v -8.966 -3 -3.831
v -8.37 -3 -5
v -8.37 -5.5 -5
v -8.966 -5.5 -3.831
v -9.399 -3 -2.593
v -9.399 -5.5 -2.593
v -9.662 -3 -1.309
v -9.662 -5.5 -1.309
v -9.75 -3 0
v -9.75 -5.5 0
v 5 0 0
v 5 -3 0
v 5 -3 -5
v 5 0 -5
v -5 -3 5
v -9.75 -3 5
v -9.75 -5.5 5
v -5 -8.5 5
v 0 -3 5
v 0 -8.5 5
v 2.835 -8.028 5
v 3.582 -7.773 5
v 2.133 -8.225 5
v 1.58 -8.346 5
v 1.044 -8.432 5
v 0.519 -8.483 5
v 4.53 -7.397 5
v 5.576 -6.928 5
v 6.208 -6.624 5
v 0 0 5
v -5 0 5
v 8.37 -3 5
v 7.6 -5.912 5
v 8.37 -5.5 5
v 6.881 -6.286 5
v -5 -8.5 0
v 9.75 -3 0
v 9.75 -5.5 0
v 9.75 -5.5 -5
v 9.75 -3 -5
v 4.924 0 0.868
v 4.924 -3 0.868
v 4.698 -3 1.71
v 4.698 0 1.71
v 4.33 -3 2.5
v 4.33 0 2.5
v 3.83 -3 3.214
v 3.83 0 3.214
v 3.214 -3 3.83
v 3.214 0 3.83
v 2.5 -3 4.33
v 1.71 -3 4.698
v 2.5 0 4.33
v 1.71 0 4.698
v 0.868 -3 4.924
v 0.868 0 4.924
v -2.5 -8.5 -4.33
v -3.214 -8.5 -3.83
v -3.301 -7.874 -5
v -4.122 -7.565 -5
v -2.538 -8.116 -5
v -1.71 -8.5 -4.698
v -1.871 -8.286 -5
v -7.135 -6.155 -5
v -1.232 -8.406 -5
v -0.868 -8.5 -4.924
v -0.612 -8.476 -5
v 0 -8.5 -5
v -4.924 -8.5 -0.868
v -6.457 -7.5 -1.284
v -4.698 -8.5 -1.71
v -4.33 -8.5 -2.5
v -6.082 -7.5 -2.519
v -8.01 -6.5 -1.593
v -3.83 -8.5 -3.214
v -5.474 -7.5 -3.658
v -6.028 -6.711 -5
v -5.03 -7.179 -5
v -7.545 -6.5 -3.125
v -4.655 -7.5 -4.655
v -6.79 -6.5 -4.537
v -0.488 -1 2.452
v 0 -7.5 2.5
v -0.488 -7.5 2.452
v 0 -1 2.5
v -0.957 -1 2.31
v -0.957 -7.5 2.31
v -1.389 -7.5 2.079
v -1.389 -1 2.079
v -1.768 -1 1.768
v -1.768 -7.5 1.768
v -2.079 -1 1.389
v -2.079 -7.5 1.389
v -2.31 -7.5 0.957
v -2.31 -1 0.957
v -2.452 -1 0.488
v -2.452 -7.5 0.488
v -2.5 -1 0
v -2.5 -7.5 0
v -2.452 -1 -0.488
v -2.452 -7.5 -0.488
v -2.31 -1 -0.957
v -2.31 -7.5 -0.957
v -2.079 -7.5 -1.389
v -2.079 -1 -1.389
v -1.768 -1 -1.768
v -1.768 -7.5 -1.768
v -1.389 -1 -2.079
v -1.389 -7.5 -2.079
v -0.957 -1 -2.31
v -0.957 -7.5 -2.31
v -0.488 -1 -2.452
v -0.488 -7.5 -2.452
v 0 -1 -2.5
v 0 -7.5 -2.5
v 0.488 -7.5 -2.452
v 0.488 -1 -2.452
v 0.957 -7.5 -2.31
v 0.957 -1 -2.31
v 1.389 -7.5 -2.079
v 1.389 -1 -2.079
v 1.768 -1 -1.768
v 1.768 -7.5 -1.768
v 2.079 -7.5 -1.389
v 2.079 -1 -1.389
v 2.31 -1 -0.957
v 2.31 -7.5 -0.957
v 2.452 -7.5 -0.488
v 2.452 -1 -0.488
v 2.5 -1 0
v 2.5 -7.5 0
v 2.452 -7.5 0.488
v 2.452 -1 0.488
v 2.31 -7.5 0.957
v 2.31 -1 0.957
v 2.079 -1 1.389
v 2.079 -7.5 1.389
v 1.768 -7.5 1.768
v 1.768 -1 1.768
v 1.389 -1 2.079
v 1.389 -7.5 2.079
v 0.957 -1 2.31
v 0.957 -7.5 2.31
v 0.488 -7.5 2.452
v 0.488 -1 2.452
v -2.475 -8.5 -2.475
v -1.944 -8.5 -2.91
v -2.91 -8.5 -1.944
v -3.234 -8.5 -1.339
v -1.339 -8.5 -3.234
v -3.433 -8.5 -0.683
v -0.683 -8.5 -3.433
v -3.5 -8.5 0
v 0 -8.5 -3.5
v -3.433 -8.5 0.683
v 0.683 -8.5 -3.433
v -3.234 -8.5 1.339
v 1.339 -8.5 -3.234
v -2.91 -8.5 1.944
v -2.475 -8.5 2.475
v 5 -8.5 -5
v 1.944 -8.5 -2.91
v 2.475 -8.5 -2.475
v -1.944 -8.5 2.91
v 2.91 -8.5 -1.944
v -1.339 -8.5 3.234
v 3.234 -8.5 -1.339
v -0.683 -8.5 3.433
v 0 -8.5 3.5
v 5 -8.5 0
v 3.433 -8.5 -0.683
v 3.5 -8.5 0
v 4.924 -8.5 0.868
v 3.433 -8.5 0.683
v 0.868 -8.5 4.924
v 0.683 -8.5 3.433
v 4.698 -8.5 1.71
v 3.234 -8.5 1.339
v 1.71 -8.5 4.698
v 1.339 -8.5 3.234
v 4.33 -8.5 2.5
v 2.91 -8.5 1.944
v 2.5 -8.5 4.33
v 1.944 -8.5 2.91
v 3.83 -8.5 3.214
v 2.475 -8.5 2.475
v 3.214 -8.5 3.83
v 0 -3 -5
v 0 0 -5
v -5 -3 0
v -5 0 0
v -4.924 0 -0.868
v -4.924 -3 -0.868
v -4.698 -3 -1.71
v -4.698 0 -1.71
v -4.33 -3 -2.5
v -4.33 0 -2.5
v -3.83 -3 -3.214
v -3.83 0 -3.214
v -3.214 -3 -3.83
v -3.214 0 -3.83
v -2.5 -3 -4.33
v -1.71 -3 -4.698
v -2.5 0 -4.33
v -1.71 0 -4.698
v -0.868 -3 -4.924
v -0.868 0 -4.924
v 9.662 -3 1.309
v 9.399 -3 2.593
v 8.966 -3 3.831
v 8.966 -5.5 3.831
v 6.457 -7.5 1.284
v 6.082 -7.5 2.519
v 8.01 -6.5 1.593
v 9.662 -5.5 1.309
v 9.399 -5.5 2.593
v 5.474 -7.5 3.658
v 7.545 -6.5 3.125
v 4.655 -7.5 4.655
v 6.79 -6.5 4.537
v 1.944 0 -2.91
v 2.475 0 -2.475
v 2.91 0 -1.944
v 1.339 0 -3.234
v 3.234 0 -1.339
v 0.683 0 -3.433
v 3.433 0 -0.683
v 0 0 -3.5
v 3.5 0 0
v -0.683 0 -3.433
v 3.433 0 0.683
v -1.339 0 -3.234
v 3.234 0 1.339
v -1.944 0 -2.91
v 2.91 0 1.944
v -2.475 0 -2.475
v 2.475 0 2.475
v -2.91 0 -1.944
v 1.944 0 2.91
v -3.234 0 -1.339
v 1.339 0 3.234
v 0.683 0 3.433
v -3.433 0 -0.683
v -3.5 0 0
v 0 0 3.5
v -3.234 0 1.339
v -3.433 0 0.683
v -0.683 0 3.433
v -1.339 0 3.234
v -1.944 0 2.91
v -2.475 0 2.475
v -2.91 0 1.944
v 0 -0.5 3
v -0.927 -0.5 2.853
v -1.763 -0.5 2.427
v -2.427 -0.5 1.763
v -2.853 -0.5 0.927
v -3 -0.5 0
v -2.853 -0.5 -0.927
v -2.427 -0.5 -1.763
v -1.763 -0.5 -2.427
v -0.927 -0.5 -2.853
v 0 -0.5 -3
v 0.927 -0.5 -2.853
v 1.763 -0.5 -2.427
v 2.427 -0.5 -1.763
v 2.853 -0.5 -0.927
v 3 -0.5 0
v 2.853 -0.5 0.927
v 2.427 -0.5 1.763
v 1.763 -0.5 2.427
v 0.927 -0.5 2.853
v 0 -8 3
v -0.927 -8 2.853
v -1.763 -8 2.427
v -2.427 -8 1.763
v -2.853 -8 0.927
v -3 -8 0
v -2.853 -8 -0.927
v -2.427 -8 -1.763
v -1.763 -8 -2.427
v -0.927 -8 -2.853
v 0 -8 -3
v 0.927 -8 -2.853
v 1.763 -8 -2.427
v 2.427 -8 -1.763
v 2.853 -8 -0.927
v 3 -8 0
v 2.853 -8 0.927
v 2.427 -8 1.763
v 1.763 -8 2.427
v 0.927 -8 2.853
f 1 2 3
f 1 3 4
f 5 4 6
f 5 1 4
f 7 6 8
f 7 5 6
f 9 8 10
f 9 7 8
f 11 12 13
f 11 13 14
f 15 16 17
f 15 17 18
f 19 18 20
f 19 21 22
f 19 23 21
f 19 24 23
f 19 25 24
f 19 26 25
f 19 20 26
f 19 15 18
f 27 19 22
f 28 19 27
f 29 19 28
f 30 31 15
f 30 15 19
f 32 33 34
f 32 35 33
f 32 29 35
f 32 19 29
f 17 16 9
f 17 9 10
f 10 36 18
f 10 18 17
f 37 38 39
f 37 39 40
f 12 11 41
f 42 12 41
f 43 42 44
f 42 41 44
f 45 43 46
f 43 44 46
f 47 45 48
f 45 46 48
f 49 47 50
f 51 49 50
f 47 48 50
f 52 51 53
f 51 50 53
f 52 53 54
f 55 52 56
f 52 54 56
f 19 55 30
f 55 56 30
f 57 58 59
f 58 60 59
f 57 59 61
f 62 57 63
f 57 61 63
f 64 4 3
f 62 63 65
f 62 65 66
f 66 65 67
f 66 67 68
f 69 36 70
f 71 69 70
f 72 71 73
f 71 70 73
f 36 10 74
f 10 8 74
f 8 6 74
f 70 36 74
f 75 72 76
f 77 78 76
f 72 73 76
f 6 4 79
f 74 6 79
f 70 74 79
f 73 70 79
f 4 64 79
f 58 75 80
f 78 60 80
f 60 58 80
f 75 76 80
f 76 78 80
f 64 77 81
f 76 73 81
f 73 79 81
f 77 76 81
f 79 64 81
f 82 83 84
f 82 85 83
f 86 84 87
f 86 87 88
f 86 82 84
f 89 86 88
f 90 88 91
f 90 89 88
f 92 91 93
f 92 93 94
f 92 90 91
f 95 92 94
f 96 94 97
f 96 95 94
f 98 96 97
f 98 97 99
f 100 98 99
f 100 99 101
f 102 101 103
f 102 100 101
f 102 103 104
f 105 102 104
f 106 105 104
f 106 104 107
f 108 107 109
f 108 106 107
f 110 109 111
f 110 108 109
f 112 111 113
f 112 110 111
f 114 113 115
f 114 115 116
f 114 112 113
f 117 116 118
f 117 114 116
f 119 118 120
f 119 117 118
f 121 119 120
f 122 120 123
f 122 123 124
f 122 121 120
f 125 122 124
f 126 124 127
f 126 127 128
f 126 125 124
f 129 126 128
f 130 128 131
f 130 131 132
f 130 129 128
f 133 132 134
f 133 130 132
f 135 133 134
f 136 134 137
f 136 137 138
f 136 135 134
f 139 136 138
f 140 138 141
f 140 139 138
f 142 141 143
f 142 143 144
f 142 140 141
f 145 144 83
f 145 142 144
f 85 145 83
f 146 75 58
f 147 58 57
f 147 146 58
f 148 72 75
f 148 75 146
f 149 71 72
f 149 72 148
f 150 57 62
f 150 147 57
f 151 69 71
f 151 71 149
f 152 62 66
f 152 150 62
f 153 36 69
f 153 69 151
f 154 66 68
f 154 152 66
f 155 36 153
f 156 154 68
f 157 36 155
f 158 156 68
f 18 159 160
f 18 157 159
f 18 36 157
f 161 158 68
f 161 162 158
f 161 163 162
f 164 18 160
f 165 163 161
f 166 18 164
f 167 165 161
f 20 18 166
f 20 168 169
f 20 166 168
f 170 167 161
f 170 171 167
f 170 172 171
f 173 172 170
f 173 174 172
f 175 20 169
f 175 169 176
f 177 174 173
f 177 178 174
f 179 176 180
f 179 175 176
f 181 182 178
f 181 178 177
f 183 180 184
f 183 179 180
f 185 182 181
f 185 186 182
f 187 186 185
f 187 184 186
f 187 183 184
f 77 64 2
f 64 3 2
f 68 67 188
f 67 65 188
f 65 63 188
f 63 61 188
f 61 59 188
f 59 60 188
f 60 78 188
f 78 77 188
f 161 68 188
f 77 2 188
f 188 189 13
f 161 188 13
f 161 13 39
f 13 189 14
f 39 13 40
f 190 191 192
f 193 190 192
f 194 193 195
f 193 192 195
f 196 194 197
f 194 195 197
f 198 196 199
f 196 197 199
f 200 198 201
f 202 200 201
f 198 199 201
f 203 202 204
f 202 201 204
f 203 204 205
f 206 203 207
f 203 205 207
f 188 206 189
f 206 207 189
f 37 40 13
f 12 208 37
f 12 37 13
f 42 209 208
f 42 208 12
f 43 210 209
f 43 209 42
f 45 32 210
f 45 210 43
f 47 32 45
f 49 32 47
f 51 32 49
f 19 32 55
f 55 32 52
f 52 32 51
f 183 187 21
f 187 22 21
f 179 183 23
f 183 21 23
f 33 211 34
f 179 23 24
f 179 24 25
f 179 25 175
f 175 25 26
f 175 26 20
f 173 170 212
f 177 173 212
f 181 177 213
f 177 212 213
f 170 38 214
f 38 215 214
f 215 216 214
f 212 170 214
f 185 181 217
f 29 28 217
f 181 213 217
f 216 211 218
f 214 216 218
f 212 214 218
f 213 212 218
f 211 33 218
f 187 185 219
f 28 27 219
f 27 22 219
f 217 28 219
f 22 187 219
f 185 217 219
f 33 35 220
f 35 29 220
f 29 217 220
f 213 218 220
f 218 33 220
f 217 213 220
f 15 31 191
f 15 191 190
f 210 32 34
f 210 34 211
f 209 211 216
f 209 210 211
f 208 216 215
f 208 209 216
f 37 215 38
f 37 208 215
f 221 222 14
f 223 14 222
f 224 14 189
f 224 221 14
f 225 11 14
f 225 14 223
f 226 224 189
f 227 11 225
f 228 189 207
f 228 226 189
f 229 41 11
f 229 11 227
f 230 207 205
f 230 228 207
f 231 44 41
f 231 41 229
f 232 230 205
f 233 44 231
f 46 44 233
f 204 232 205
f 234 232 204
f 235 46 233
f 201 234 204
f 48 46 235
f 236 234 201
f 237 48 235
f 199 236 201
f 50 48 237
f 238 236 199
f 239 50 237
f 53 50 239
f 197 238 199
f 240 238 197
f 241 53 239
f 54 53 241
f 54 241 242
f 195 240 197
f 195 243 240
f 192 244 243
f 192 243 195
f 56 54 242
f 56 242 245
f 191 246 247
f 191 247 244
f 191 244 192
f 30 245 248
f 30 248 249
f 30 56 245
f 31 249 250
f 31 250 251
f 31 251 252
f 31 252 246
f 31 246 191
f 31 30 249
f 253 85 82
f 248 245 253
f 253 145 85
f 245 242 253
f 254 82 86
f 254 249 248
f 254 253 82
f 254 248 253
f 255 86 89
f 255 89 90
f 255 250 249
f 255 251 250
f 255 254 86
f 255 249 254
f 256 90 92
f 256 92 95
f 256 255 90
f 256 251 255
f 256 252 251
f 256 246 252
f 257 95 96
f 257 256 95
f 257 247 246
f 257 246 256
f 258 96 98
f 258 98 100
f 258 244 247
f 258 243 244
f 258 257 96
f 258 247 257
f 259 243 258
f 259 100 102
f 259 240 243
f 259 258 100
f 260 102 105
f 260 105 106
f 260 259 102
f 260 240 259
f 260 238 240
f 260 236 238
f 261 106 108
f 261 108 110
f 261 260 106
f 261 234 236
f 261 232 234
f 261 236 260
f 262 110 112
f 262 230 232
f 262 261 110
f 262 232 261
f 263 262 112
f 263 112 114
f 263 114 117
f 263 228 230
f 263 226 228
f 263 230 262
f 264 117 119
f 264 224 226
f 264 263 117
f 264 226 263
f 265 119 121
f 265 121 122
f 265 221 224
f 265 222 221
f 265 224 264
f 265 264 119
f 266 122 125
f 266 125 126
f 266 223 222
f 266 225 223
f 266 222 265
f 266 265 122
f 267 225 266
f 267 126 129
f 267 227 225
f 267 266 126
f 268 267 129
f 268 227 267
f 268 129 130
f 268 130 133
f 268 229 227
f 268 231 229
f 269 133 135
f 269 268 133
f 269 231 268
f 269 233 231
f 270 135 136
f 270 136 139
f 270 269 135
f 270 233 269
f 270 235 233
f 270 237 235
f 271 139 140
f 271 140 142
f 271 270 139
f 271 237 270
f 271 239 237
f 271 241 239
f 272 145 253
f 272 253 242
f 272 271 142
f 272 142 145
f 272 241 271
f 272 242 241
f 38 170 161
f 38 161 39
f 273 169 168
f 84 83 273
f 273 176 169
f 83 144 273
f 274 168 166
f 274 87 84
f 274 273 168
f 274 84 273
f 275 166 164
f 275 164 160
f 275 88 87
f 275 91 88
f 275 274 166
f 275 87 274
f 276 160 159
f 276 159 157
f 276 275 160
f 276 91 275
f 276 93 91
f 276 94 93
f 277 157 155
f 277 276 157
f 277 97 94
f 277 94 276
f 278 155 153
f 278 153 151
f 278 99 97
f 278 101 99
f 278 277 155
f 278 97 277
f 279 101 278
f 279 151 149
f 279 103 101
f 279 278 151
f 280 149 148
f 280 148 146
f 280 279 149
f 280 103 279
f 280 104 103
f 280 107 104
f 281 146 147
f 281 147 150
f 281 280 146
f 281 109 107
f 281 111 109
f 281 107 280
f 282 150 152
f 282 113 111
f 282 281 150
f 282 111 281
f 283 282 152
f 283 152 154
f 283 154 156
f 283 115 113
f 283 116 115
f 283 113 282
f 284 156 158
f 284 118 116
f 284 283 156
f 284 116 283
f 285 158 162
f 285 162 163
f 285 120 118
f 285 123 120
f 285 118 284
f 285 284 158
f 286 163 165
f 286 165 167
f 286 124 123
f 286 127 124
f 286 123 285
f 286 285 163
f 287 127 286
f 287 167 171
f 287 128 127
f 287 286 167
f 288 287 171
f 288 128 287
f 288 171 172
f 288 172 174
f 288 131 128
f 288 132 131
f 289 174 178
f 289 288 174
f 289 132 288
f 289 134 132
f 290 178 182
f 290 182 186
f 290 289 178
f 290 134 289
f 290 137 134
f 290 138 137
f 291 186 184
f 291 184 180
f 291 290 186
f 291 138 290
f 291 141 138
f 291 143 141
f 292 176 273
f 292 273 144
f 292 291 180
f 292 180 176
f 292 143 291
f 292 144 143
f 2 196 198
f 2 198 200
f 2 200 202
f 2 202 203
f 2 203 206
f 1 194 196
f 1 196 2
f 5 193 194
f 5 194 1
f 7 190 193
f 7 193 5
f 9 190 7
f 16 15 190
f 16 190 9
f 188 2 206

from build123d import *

# Parameters (mm, degrees)
EXTRUDE_1_DEPTH     = 5
CUT_EXTRUDE_1_DEPTH = 3
CUT_EXTRUDE_2_DEPTH = 6.5


with BuildPart() as part:
    # Эскиз1 → Бобышка-Вытянуть1 (new body, symmetric)
    with BuildSketch(Plane.XY):
        Polygon((5, 0), (-5, 0), (-5, -3), (-9.75, -3), (-9.75, -8.5), (9.75, -8.5), (9.75, -3), (5, -3), align=None)
    extrude(amount=EXTRUDE_1_DEPTH, both=True)

    # Эскиз3 → Отверстие обработанное метчиком M62 (revolve, cut)
    with BuildSketch(Plane(origin=(0, 0, 0), x_dir=(0, 0, 1), z_dir=(1, 0, 0))):
        Polygon((0, 0), (0, 8.5), (3.5, 8.5), (2.5, 7.5), (2.5, 1), (3.5, 0), align=None)
    revolve(axis=Axis((0, 6.35, 0), (0, -1, 0)), mode=Mode.SUBTRACT)

    # Эскиз4 → Вырез-Вытянуть1 (cut)
    with BuildSketch(Plane(origin=(0, 0, 0), x_dir=(1, 0, 0), z_dir=(0, 1, 0))):
        with BuildLine():
            Line((-5, 5), (-5, 0))
            ThreePointArc((-5, 0), (-3.535533906, 3.535533906), (0, 5))
            Line((0, 5), (-5, 5))
        make_face()
        with BuildLine():
            Line((0, -5), (5, -5))
            Line((5, -5), (5, 0))
            ThreePointArc((5, 0), (3.535533906, -3.535533906), (0, -5))
        make_face()
    extrude(amount=-CUT_EXTRUDE_1_DEPTH, mode=Mode.SUBTRACT)

    # Эскиз5 → Вырез-Вытянуть2 (cut, through all)
    with BuildSketch(Plane(origin=(0, -3, 0), x_dir=(1, 0, 0), z_dir=(0, 1, 0))):
        with BuildLine():
            Line((-9.75, 0), (-9.75, 5))
            Line((-9.75, 5), (-8.370334521, 5))
            ThreePointArc((-8.370334521, 5), (-9.398756875, 2.59342808), (-9.75, 0))
        make_face()
        with BuildLine():
            Line((9.75, 0), (9.75, -5))
            Line((9.75, -5), (8.370334521, -5))
            ThreePointArc((8.370334521, -5), (9.398756875, -2.59342808), (9.75, 0))
        make_face()
    extrude(amount=-CUT_EXTRUDE_2_DEPTH, mode=Mode.SUBTRACT)

    # Вырез-По траектории1: sweep along a path in Эскиз7
    with BuildLine(Plane.XZ.offset(8.5)) as sweep_1_path:
        Line((0, 9.75), (-9.75, 9.75))
        Line((-9.75, 9.75), (-9.75, 0))
        ThreePointArc((-9.75, 0), (-6.894291117, -6.894291117), (0, -9.75))
        Line((0, -9.75), (9.75, -9.75))
        Line((9.75, -9.75), (9.75, 0))
        ThreePointArc((9.75, 0), (6.894291117, 6.894291117), (0, 9.75))
    # Эскиз6 → Вырез-По траектории1 (sweep, cut)
    with BuildSketch(Plane.XY.offset(5)):
        Polygon((-9.75, -5.5), (-9.75, -8.5), (-5, -8.5), align=None)
    sweep(path=sweep_1_path.line, transition=Transition.RIGHT, mode=Mode.SUBTRACT)


solid = part.part
